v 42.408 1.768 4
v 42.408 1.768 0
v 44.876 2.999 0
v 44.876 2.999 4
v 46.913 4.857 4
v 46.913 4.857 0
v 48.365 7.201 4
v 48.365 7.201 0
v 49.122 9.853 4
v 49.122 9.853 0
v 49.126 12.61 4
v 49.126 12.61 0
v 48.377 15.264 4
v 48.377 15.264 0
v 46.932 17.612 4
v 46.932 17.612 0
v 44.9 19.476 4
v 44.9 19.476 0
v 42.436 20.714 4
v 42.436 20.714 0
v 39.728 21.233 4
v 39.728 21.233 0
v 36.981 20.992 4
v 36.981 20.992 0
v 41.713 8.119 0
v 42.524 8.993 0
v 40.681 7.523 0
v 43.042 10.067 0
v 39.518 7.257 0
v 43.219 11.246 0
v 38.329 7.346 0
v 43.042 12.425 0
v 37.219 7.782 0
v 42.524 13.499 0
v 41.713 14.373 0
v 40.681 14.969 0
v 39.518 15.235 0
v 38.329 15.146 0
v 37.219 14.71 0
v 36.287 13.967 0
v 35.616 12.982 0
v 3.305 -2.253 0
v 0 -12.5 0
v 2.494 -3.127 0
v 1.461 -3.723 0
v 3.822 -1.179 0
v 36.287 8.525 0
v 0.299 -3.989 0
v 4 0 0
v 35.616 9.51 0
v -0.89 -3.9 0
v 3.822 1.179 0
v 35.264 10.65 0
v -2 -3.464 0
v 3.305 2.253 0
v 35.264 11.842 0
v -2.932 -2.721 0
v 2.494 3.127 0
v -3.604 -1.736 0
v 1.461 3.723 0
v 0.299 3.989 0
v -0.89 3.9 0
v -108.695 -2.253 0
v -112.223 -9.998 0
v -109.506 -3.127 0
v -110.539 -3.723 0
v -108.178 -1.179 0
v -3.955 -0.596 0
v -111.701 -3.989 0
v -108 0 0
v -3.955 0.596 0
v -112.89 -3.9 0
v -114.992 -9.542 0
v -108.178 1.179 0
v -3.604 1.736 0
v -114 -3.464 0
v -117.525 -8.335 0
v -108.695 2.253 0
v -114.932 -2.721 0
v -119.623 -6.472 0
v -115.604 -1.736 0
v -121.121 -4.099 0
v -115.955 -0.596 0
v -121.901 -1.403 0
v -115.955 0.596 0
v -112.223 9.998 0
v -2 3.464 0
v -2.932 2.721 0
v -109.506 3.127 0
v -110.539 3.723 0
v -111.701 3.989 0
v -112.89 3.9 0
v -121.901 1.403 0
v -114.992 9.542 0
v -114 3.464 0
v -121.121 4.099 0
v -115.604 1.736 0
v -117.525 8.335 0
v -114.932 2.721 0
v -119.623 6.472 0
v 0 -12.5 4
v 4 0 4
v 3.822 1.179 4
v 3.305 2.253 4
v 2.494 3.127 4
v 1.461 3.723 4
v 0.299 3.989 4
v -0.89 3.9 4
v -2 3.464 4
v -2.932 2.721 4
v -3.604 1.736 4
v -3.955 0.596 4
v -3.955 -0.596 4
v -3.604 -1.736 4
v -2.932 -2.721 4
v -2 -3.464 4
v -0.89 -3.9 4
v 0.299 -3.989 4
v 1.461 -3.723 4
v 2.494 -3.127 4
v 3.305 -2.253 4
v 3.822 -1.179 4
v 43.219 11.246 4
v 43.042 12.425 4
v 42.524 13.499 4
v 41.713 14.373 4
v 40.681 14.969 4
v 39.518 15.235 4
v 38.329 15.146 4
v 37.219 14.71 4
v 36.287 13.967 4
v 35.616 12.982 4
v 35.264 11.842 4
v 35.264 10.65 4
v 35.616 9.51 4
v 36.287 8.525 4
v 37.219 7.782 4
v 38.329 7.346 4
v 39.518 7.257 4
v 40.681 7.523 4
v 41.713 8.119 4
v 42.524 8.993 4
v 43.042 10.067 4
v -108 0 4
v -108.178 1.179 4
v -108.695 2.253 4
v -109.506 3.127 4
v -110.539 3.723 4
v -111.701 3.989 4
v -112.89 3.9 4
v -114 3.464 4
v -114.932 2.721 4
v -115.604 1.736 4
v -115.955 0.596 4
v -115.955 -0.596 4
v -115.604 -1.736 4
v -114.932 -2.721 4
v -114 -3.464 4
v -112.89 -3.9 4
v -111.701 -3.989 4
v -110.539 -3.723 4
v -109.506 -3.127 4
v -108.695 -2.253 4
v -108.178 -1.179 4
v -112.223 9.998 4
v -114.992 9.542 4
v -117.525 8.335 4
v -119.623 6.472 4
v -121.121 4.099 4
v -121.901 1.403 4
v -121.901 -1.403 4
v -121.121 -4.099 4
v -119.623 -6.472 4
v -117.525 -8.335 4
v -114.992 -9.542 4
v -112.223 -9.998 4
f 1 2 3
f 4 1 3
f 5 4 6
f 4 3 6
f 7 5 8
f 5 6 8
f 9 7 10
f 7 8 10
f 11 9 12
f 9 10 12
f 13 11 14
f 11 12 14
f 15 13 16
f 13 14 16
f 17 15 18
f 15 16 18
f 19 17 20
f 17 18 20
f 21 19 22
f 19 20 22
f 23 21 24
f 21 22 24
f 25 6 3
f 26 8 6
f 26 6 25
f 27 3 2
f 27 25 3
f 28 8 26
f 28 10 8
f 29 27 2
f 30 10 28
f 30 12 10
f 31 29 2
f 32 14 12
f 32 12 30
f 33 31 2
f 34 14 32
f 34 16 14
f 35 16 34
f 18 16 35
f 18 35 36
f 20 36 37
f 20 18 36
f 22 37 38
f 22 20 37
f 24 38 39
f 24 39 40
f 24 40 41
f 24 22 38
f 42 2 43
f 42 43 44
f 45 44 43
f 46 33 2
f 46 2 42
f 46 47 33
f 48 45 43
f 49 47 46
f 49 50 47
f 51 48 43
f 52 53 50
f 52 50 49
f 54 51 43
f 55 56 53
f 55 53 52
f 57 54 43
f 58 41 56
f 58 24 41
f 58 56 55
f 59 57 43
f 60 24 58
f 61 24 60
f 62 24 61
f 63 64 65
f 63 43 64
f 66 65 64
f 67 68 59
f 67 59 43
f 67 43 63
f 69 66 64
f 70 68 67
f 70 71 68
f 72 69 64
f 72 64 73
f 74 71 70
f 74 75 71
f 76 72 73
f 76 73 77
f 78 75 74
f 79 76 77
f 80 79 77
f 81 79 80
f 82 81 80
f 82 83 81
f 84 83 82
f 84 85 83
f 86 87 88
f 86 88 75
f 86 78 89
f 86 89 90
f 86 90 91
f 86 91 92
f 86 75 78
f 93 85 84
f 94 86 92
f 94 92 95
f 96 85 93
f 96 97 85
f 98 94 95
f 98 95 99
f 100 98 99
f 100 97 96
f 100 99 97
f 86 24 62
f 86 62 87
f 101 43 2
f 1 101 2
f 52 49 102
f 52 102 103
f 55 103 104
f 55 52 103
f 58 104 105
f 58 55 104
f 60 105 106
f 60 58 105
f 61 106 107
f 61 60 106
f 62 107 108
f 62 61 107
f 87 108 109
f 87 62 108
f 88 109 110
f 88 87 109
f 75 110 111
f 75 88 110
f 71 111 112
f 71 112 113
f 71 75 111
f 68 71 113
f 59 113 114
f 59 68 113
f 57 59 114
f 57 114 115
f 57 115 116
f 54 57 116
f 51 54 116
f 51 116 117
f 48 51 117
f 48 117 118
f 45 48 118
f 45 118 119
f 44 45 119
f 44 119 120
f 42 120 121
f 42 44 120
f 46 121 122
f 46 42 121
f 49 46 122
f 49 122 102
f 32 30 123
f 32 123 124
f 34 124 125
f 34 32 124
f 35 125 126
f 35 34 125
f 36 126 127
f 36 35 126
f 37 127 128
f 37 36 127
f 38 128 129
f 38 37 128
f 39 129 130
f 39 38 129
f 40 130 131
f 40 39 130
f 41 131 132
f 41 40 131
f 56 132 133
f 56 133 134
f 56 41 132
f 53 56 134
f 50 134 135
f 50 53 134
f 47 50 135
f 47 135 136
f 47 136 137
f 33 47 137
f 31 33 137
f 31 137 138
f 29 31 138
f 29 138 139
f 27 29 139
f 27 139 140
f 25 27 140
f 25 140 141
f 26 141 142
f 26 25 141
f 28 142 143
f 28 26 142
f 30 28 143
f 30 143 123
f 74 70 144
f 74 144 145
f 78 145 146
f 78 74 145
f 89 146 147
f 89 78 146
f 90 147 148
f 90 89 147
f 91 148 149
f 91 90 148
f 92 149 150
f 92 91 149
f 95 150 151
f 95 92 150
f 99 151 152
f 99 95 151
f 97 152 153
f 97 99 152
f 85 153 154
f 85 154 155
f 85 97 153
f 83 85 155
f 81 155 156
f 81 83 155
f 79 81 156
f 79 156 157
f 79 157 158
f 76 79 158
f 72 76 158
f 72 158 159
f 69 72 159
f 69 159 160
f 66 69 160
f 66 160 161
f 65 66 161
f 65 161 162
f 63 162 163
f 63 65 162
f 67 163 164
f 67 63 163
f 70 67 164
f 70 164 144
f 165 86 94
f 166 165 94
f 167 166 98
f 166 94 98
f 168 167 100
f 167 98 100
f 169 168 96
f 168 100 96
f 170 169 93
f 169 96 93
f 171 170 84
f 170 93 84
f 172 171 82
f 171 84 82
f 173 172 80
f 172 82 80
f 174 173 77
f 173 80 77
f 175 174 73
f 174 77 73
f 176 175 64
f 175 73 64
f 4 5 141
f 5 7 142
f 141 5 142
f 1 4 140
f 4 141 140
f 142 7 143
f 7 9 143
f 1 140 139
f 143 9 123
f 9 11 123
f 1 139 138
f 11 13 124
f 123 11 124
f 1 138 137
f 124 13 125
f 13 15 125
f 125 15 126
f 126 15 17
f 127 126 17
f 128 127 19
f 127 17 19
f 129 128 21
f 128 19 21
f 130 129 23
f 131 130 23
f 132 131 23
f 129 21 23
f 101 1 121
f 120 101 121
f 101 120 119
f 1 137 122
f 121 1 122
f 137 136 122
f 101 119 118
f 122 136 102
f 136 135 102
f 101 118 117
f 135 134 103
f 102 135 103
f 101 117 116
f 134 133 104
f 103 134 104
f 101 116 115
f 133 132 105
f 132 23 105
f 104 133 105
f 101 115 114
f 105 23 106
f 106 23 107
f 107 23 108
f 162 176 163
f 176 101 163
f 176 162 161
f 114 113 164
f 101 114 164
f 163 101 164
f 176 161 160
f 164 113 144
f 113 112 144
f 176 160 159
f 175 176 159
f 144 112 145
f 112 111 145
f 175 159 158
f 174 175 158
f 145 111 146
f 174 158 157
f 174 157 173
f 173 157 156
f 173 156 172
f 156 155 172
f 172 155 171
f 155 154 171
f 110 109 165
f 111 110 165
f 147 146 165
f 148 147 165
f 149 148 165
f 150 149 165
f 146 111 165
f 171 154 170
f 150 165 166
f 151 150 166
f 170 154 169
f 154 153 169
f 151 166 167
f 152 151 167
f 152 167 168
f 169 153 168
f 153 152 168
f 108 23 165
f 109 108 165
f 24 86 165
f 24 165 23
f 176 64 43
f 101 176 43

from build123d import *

# Parameters (mm, degrees)
CROQUIS1_R              = 4
SALIENTE_EXTRUIR1_DEPTH = 4


with BuildPart() as part:
    # Croquis1 → Saliente-Extruir1 (new body)
    # profile 1 of 2: a face of its own
    with BuildSketch(Plane.XY):
        with BuildLine():
            Line((0, -12.5), (42.408285537, 1.768055956))
            ThreePointArc((42.408285537, 1.768055956), (48.843358342, 13.962787444), (36.981350661, 20.992325968))
            Line((36.981350661, 20.992325968), (0, 12.5))
            Line((0, 12.5), (-112.222936903, 9.997514648))
            ThreePointArc((-112.222936903, 9.997514648), (-122, 0), (-112.222936903, -9.997514648))
            Line((-112.222936903, -9.997514648), (0, -12.5))
        make_face()
        with Locations((-112, 0)):
            Circle(CROQUIS1_R, mode=Mode.SUBTRACT)
        with Locations((39.219477194, 11.246004117)):
            Circle(CROQUIS1_R, mode=Mode.SUBTRACT)
        Circle(CROQUIS1_R, mode=Mode.SUBTRACT)
    # profile 2 of 2: a face of its own
    with BuildSketch(Plane.XY):
        Polygon((-112.222936903, 9.997514648), (36.981350661, 20.992325968), (0, 12.5), align=None)
    extrude(amount=SALIENTE_EXTRUIR1_DEPTH)


solid = part.part
